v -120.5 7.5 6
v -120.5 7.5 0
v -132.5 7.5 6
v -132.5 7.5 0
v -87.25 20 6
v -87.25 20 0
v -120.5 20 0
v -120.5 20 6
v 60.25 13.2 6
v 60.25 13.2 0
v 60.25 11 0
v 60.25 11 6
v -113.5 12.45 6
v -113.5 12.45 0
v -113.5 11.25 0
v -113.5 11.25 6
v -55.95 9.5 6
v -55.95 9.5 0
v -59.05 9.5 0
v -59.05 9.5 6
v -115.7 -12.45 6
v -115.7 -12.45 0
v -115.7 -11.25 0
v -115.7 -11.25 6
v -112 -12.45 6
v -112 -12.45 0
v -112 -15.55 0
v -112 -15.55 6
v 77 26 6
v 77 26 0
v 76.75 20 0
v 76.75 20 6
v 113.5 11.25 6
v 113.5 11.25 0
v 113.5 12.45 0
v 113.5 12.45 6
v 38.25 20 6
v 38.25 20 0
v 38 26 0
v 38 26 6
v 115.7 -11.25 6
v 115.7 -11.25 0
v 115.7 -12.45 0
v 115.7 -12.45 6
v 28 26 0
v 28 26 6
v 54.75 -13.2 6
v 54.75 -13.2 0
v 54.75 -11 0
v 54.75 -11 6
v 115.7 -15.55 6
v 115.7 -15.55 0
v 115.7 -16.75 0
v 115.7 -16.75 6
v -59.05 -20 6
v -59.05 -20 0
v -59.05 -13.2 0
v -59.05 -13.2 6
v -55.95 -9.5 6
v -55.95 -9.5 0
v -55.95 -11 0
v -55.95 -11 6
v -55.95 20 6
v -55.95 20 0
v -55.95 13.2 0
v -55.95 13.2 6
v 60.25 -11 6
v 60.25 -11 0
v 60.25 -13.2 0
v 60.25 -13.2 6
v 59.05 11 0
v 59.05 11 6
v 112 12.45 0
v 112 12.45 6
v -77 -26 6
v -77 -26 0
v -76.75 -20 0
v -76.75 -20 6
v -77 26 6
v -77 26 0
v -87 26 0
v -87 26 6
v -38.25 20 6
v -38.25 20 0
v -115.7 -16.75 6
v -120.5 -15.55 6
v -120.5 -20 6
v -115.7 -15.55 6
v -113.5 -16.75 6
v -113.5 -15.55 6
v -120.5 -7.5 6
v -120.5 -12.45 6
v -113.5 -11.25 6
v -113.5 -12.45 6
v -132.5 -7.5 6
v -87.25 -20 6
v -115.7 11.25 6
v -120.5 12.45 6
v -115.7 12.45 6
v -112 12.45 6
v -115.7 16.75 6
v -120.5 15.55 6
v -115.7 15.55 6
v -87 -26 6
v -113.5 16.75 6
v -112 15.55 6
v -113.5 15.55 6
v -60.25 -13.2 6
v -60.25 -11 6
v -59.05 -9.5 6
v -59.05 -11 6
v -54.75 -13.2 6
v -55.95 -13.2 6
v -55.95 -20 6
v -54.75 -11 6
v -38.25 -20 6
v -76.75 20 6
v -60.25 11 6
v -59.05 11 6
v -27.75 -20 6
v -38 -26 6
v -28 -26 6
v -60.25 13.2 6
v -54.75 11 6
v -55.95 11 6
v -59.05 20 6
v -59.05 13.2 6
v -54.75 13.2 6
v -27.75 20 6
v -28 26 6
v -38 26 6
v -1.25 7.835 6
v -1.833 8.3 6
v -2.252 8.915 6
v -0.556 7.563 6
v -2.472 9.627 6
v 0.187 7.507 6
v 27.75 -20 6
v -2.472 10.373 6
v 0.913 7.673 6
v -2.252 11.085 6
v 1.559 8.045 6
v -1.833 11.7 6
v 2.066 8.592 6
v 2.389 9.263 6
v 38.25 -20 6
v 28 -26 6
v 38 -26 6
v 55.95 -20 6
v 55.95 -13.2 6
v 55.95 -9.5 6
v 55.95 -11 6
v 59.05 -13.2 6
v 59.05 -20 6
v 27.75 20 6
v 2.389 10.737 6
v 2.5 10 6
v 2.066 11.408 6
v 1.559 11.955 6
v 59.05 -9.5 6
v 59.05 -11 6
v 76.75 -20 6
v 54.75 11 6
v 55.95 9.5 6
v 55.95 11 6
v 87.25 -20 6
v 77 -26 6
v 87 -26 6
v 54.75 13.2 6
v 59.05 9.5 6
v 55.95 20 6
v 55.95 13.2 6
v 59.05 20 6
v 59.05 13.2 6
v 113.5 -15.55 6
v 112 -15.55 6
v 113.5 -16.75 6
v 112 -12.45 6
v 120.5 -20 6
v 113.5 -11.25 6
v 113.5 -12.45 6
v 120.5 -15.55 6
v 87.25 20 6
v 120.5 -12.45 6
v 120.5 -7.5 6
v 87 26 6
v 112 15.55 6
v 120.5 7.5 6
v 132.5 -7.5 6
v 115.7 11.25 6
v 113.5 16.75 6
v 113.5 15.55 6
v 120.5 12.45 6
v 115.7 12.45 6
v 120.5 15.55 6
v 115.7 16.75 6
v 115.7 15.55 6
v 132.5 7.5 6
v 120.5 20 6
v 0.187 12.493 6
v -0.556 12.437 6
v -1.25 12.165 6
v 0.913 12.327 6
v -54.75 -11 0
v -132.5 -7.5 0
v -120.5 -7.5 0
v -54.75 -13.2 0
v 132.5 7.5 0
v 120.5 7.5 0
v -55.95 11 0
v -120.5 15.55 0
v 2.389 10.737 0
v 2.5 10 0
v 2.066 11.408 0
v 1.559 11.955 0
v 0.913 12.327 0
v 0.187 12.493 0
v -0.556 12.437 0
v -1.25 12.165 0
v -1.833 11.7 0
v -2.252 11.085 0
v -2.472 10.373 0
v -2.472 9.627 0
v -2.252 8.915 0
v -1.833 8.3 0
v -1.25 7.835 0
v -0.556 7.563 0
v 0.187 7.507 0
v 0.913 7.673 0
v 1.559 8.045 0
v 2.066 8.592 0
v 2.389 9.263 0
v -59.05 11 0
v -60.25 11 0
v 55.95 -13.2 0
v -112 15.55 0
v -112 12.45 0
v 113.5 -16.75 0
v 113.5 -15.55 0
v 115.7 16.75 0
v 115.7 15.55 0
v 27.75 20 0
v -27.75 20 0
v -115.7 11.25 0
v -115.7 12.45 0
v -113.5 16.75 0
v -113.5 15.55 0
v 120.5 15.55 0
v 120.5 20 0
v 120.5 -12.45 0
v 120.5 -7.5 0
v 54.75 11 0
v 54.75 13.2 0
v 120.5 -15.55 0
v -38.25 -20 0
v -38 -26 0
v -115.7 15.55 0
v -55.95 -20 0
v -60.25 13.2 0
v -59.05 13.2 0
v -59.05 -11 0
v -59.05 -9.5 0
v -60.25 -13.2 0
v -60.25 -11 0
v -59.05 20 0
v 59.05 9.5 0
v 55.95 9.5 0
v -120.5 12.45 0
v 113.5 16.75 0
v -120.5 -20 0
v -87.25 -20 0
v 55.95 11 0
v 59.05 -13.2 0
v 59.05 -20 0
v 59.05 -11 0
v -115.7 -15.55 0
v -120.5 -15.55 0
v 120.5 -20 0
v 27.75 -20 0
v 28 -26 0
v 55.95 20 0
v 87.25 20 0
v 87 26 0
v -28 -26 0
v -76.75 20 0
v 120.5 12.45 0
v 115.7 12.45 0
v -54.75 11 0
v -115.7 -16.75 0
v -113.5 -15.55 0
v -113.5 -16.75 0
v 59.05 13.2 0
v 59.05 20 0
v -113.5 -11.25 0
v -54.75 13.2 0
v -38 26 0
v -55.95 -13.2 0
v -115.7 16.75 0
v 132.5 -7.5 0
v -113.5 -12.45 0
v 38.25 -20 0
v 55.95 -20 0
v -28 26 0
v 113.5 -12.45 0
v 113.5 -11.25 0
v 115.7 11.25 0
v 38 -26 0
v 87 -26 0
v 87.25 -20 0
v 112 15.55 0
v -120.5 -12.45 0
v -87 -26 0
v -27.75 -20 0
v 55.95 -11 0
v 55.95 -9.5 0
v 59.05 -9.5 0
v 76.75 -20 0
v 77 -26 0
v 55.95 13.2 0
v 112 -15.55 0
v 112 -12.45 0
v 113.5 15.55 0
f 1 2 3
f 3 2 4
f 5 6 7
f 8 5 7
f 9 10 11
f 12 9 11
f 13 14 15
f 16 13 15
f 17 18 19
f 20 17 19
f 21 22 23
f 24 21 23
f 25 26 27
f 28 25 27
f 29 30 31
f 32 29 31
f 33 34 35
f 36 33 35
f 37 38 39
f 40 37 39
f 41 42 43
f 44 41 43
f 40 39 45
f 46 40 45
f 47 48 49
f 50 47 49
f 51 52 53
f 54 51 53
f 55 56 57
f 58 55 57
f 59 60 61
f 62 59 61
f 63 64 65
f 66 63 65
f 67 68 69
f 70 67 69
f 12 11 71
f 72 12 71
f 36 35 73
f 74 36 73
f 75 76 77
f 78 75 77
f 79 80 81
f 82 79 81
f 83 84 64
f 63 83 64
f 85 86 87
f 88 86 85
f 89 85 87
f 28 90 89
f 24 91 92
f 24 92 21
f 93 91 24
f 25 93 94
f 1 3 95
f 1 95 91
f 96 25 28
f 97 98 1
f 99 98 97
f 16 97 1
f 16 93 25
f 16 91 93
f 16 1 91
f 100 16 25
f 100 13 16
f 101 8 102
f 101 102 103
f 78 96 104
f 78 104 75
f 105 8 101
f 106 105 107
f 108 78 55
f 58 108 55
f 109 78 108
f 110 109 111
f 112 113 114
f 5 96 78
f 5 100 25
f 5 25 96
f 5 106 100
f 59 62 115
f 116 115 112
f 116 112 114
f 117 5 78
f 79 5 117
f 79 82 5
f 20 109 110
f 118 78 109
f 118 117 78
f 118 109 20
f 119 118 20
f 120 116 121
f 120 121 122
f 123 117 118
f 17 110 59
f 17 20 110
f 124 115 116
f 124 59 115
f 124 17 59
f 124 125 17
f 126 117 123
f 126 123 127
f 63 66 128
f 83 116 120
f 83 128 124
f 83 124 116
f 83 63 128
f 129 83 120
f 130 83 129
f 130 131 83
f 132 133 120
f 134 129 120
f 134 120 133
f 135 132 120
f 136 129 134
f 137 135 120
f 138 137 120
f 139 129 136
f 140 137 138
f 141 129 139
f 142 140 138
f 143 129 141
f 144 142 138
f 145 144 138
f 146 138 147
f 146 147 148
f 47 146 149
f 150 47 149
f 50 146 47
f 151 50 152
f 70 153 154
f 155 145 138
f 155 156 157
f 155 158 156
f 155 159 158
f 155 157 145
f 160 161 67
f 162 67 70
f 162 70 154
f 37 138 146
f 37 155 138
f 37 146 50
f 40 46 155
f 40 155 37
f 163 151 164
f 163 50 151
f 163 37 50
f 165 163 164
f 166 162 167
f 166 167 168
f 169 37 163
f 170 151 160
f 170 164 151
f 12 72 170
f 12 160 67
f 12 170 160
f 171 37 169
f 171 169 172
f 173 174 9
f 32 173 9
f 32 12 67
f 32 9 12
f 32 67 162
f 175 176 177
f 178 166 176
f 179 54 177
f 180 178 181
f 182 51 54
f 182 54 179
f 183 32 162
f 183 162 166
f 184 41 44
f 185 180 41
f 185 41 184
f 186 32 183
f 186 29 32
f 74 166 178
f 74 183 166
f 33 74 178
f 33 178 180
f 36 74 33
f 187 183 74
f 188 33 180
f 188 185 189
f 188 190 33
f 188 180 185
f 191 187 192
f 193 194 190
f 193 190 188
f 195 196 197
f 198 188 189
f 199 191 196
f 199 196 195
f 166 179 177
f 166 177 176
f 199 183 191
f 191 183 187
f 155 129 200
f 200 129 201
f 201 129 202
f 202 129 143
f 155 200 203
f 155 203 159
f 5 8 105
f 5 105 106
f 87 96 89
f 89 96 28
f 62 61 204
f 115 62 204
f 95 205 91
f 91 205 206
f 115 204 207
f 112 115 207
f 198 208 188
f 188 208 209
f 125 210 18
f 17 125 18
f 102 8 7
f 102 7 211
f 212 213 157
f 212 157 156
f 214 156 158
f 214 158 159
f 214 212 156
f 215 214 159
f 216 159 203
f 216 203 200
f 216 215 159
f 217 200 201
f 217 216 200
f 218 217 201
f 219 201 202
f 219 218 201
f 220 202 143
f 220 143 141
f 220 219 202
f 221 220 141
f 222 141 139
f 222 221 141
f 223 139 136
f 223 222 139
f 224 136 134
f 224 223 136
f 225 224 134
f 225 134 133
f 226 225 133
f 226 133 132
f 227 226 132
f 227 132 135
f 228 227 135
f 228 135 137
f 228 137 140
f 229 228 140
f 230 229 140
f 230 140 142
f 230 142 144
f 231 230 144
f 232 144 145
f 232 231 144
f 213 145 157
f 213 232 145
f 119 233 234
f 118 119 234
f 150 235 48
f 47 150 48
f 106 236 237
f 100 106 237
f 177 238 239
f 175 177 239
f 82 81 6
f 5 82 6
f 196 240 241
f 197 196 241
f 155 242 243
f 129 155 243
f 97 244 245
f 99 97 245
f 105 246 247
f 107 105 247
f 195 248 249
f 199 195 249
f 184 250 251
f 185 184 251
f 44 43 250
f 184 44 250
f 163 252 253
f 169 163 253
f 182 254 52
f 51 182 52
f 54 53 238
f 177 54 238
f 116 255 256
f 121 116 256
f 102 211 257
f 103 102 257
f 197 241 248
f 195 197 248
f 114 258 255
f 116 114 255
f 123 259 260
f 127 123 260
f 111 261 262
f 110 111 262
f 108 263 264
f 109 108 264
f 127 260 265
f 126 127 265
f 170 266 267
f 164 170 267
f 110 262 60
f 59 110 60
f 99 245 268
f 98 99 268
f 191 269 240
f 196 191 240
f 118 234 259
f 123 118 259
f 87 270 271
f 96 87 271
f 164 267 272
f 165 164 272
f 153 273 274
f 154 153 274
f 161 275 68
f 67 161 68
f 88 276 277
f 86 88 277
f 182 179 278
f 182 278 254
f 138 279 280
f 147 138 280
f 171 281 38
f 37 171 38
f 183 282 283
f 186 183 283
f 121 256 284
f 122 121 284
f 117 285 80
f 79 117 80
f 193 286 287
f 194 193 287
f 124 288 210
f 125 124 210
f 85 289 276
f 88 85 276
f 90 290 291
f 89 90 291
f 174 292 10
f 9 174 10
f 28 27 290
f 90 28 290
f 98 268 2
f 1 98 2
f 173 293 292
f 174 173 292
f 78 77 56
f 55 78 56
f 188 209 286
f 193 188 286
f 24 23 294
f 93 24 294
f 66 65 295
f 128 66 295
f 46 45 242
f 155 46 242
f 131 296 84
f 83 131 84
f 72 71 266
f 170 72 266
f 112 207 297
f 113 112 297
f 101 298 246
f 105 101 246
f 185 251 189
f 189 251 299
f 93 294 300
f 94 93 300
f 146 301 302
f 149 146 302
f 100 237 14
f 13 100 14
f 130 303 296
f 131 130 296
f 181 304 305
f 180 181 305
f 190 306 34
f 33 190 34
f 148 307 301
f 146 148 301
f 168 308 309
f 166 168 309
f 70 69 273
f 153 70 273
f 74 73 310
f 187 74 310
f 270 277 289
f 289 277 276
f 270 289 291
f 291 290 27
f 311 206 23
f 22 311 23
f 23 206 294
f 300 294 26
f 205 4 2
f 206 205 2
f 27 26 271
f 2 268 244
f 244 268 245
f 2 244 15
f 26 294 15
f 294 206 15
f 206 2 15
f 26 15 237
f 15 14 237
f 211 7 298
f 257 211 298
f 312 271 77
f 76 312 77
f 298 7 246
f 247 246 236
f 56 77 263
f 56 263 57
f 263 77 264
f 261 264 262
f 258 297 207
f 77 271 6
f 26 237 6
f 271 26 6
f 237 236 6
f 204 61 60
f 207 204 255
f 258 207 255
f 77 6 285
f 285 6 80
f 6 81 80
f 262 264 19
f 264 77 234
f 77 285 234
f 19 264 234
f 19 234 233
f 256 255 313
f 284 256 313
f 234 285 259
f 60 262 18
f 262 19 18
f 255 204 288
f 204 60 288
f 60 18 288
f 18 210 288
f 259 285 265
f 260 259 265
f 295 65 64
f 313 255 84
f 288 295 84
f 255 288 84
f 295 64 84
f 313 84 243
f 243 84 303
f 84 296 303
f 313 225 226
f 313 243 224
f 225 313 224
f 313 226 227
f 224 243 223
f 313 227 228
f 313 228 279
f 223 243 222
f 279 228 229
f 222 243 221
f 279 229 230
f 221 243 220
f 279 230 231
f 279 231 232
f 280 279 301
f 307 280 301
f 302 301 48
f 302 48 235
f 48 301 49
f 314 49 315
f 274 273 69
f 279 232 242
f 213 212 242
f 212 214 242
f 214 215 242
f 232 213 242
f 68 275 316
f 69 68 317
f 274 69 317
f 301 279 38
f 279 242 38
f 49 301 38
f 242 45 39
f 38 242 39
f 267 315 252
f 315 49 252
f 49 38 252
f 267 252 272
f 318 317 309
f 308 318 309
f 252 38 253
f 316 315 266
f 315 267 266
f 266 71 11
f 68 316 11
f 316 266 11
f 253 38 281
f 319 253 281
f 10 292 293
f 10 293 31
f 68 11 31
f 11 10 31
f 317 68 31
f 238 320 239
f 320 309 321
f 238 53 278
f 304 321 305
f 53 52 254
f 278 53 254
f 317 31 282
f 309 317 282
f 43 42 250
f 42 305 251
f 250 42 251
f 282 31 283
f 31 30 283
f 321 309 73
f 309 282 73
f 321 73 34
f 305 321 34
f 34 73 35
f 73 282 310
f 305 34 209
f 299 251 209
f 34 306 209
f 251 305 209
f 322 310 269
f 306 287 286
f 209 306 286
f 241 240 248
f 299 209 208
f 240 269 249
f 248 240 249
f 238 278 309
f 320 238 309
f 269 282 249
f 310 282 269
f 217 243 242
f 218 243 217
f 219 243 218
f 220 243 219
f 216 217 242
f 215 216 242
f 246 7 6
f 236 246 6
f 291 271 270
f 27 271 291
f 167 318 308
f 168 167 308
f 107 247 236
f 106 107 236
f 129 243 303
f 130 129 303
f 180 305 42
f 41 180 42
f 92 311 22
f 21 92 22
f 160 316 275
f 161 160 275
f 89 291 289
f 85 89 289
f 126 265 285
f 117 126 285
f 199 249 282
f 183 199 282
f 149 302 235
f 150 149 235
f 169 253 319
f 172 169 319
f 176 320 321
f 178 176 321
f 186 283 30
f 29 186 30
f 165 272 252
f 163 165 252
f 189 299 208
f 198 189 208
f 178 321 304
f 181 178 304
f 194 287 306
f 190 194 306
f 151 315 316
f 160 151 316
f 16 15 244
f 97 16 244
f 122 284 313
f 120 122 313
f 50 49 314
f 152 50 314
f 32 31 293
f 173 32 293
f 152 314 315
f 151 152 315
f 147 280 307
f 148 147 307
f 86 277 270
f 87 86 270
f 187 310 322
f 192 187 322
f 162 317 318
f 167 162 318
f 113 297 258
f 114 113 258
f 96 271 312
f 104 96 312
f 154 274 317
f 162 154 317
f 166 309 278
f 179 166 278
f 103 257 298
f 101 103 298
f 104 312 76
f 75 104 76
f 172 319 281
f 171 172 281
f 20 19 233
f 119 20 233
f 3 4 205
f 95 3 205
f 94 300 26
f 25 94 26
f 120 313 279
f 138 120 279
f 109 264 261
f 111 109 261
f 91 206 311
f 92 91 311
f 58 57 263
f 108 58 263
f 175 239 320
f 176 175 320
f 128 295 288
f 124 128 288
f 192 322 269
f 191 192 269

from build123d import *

# Parameters (mm, degrees)
SKETCH_1_R      = 2.5
EXTRUDE_1_DEPTH = 6


with BuildPart() as part:
    # Эскиз1 → Бобышка-Вытянуть1 (new body)
    with BuildSketch(Plane.XY):
        Polygon((-28, -26), (-27.75, -20), (27.75, -20), (28, -26), (38, -26), (38.25, -20), (43.45, -20), (55.95, -20), (55.95, -13.2), (54.75, -13.2), (54.75, -11), (55.95, -11), (55.95, -9.5), (59.05, -9.5), (59.05, -11), (60.25, -11), (60.25, -13.2), (59.05, -13.2), (59.05, -20), (64.25, -20), (76.75, -20), (77, -26), (87, -26), (87.25, -20), (120.5, -20), (120.5, -15.55), (115.7, -15.55), (115.7, -16.75), (113.5, -16.75), (113.5, -15.55), (112, -15.55), (112, -12.45), (113.5, -12.45), (113.5, -11.25), (115.7, -11.25), (115.7, -12.45), (120.5, -12.45), (120.5, -7.5), (132.5, -7.5), (132.5, 7.5), (120.5, 7.5), (120.5, 12.45), (115.7, 12.45), (115.7, 11.25), (113.5, 11.25), (113.5, 12.45), (112, 12.45), (112, 15.55), (113.5, 15.55), (113.5, 16.75), (115.7, 16.75), (115.7, 15.55), (120.5, 15.55), (120.5, 20), (87.25, 20), (87, 26), (77, 26), (76.75, 20), (64.25, 20), (59.05, 20), (59.05, 13.2), (60.25, 13.2), (60.25, 11), (59.05, 11), (59.05, 9.5), (55.95, 9.5), (55.95, 11), (54.75, 11), (54.75, 13.2), (55.95, 13.2), (55.95, 20), (43.45, 20), (38.25, 20), (38, 26), (28, 26), (27.75, 20), (-27.75, 20), (-28, 26), (-38, 26), (-38.25, 20), (-43.45, 20), (-55.95, 20), (-55.95, 13.2), (-54.75, 13.2), (-54.75, 11), (-55.95, 11), (-55.95, 9.5), (-59.05, 9.5), (-59.05, 11), (-60.25, 11), (-60.25, 13.2), (-59.05, 13.2), (-59.05, 20), (-71.55, 20), (-76.75, 20), (-77, 26), (-87, 26), (-87.25, 20), (-120.5, 20), (-120.5, 15.55), (-115.7, 15.55), (-115.7, 16.75), (-113.5, 16.75), (-113.5, 15.55), (-112, 15.55), (-112, 12.45), (-113.5, 12.45), (-113.5, 11.25), (-115.7, 11.25), (-115.7, 12.45), (-120.5, 12.45), (-120.5, 7.5), (-132.5, 7.5), (-132.5, -7.5), (-120.5, -7.5), (-120.5, -12.45), (-115.7, -12.45), (-115.7, -11.25), (-113.5, -11.25), (-113.5, -12.45), (-112, -12.45), (-112, -15.55), (-113.5, -15.55), (-113.5, -16.75), (-115.7, -16.75), (-115.7, -15.55), (-120.5, -15.55), (-120.5, -20), (-87.25, -20), (-87, -26), (-77, -26), (-76.75, -20), (-71.55, -20), (-59.05, -20), (-59.05, -13.2), (-60.25, -13.2), (-60.25, -11), (-59.05, -11), (-59.05, -9.5), (-55.95, -9.5), (-55.95, -11), (-54.75, -11), (-54.75, -13.2), (-55.95, -13.2), (-55.95, -20), (-43.45, -20), (-38.25, -20), (-38, -26), align=None)
        with Locations((0, 10)):
            Circle(SKETCH_1_R, mode=Mode.SUBTRACT)
    extrude(amount=EXTRUDE_1_DEPTH)


solid = part.part
